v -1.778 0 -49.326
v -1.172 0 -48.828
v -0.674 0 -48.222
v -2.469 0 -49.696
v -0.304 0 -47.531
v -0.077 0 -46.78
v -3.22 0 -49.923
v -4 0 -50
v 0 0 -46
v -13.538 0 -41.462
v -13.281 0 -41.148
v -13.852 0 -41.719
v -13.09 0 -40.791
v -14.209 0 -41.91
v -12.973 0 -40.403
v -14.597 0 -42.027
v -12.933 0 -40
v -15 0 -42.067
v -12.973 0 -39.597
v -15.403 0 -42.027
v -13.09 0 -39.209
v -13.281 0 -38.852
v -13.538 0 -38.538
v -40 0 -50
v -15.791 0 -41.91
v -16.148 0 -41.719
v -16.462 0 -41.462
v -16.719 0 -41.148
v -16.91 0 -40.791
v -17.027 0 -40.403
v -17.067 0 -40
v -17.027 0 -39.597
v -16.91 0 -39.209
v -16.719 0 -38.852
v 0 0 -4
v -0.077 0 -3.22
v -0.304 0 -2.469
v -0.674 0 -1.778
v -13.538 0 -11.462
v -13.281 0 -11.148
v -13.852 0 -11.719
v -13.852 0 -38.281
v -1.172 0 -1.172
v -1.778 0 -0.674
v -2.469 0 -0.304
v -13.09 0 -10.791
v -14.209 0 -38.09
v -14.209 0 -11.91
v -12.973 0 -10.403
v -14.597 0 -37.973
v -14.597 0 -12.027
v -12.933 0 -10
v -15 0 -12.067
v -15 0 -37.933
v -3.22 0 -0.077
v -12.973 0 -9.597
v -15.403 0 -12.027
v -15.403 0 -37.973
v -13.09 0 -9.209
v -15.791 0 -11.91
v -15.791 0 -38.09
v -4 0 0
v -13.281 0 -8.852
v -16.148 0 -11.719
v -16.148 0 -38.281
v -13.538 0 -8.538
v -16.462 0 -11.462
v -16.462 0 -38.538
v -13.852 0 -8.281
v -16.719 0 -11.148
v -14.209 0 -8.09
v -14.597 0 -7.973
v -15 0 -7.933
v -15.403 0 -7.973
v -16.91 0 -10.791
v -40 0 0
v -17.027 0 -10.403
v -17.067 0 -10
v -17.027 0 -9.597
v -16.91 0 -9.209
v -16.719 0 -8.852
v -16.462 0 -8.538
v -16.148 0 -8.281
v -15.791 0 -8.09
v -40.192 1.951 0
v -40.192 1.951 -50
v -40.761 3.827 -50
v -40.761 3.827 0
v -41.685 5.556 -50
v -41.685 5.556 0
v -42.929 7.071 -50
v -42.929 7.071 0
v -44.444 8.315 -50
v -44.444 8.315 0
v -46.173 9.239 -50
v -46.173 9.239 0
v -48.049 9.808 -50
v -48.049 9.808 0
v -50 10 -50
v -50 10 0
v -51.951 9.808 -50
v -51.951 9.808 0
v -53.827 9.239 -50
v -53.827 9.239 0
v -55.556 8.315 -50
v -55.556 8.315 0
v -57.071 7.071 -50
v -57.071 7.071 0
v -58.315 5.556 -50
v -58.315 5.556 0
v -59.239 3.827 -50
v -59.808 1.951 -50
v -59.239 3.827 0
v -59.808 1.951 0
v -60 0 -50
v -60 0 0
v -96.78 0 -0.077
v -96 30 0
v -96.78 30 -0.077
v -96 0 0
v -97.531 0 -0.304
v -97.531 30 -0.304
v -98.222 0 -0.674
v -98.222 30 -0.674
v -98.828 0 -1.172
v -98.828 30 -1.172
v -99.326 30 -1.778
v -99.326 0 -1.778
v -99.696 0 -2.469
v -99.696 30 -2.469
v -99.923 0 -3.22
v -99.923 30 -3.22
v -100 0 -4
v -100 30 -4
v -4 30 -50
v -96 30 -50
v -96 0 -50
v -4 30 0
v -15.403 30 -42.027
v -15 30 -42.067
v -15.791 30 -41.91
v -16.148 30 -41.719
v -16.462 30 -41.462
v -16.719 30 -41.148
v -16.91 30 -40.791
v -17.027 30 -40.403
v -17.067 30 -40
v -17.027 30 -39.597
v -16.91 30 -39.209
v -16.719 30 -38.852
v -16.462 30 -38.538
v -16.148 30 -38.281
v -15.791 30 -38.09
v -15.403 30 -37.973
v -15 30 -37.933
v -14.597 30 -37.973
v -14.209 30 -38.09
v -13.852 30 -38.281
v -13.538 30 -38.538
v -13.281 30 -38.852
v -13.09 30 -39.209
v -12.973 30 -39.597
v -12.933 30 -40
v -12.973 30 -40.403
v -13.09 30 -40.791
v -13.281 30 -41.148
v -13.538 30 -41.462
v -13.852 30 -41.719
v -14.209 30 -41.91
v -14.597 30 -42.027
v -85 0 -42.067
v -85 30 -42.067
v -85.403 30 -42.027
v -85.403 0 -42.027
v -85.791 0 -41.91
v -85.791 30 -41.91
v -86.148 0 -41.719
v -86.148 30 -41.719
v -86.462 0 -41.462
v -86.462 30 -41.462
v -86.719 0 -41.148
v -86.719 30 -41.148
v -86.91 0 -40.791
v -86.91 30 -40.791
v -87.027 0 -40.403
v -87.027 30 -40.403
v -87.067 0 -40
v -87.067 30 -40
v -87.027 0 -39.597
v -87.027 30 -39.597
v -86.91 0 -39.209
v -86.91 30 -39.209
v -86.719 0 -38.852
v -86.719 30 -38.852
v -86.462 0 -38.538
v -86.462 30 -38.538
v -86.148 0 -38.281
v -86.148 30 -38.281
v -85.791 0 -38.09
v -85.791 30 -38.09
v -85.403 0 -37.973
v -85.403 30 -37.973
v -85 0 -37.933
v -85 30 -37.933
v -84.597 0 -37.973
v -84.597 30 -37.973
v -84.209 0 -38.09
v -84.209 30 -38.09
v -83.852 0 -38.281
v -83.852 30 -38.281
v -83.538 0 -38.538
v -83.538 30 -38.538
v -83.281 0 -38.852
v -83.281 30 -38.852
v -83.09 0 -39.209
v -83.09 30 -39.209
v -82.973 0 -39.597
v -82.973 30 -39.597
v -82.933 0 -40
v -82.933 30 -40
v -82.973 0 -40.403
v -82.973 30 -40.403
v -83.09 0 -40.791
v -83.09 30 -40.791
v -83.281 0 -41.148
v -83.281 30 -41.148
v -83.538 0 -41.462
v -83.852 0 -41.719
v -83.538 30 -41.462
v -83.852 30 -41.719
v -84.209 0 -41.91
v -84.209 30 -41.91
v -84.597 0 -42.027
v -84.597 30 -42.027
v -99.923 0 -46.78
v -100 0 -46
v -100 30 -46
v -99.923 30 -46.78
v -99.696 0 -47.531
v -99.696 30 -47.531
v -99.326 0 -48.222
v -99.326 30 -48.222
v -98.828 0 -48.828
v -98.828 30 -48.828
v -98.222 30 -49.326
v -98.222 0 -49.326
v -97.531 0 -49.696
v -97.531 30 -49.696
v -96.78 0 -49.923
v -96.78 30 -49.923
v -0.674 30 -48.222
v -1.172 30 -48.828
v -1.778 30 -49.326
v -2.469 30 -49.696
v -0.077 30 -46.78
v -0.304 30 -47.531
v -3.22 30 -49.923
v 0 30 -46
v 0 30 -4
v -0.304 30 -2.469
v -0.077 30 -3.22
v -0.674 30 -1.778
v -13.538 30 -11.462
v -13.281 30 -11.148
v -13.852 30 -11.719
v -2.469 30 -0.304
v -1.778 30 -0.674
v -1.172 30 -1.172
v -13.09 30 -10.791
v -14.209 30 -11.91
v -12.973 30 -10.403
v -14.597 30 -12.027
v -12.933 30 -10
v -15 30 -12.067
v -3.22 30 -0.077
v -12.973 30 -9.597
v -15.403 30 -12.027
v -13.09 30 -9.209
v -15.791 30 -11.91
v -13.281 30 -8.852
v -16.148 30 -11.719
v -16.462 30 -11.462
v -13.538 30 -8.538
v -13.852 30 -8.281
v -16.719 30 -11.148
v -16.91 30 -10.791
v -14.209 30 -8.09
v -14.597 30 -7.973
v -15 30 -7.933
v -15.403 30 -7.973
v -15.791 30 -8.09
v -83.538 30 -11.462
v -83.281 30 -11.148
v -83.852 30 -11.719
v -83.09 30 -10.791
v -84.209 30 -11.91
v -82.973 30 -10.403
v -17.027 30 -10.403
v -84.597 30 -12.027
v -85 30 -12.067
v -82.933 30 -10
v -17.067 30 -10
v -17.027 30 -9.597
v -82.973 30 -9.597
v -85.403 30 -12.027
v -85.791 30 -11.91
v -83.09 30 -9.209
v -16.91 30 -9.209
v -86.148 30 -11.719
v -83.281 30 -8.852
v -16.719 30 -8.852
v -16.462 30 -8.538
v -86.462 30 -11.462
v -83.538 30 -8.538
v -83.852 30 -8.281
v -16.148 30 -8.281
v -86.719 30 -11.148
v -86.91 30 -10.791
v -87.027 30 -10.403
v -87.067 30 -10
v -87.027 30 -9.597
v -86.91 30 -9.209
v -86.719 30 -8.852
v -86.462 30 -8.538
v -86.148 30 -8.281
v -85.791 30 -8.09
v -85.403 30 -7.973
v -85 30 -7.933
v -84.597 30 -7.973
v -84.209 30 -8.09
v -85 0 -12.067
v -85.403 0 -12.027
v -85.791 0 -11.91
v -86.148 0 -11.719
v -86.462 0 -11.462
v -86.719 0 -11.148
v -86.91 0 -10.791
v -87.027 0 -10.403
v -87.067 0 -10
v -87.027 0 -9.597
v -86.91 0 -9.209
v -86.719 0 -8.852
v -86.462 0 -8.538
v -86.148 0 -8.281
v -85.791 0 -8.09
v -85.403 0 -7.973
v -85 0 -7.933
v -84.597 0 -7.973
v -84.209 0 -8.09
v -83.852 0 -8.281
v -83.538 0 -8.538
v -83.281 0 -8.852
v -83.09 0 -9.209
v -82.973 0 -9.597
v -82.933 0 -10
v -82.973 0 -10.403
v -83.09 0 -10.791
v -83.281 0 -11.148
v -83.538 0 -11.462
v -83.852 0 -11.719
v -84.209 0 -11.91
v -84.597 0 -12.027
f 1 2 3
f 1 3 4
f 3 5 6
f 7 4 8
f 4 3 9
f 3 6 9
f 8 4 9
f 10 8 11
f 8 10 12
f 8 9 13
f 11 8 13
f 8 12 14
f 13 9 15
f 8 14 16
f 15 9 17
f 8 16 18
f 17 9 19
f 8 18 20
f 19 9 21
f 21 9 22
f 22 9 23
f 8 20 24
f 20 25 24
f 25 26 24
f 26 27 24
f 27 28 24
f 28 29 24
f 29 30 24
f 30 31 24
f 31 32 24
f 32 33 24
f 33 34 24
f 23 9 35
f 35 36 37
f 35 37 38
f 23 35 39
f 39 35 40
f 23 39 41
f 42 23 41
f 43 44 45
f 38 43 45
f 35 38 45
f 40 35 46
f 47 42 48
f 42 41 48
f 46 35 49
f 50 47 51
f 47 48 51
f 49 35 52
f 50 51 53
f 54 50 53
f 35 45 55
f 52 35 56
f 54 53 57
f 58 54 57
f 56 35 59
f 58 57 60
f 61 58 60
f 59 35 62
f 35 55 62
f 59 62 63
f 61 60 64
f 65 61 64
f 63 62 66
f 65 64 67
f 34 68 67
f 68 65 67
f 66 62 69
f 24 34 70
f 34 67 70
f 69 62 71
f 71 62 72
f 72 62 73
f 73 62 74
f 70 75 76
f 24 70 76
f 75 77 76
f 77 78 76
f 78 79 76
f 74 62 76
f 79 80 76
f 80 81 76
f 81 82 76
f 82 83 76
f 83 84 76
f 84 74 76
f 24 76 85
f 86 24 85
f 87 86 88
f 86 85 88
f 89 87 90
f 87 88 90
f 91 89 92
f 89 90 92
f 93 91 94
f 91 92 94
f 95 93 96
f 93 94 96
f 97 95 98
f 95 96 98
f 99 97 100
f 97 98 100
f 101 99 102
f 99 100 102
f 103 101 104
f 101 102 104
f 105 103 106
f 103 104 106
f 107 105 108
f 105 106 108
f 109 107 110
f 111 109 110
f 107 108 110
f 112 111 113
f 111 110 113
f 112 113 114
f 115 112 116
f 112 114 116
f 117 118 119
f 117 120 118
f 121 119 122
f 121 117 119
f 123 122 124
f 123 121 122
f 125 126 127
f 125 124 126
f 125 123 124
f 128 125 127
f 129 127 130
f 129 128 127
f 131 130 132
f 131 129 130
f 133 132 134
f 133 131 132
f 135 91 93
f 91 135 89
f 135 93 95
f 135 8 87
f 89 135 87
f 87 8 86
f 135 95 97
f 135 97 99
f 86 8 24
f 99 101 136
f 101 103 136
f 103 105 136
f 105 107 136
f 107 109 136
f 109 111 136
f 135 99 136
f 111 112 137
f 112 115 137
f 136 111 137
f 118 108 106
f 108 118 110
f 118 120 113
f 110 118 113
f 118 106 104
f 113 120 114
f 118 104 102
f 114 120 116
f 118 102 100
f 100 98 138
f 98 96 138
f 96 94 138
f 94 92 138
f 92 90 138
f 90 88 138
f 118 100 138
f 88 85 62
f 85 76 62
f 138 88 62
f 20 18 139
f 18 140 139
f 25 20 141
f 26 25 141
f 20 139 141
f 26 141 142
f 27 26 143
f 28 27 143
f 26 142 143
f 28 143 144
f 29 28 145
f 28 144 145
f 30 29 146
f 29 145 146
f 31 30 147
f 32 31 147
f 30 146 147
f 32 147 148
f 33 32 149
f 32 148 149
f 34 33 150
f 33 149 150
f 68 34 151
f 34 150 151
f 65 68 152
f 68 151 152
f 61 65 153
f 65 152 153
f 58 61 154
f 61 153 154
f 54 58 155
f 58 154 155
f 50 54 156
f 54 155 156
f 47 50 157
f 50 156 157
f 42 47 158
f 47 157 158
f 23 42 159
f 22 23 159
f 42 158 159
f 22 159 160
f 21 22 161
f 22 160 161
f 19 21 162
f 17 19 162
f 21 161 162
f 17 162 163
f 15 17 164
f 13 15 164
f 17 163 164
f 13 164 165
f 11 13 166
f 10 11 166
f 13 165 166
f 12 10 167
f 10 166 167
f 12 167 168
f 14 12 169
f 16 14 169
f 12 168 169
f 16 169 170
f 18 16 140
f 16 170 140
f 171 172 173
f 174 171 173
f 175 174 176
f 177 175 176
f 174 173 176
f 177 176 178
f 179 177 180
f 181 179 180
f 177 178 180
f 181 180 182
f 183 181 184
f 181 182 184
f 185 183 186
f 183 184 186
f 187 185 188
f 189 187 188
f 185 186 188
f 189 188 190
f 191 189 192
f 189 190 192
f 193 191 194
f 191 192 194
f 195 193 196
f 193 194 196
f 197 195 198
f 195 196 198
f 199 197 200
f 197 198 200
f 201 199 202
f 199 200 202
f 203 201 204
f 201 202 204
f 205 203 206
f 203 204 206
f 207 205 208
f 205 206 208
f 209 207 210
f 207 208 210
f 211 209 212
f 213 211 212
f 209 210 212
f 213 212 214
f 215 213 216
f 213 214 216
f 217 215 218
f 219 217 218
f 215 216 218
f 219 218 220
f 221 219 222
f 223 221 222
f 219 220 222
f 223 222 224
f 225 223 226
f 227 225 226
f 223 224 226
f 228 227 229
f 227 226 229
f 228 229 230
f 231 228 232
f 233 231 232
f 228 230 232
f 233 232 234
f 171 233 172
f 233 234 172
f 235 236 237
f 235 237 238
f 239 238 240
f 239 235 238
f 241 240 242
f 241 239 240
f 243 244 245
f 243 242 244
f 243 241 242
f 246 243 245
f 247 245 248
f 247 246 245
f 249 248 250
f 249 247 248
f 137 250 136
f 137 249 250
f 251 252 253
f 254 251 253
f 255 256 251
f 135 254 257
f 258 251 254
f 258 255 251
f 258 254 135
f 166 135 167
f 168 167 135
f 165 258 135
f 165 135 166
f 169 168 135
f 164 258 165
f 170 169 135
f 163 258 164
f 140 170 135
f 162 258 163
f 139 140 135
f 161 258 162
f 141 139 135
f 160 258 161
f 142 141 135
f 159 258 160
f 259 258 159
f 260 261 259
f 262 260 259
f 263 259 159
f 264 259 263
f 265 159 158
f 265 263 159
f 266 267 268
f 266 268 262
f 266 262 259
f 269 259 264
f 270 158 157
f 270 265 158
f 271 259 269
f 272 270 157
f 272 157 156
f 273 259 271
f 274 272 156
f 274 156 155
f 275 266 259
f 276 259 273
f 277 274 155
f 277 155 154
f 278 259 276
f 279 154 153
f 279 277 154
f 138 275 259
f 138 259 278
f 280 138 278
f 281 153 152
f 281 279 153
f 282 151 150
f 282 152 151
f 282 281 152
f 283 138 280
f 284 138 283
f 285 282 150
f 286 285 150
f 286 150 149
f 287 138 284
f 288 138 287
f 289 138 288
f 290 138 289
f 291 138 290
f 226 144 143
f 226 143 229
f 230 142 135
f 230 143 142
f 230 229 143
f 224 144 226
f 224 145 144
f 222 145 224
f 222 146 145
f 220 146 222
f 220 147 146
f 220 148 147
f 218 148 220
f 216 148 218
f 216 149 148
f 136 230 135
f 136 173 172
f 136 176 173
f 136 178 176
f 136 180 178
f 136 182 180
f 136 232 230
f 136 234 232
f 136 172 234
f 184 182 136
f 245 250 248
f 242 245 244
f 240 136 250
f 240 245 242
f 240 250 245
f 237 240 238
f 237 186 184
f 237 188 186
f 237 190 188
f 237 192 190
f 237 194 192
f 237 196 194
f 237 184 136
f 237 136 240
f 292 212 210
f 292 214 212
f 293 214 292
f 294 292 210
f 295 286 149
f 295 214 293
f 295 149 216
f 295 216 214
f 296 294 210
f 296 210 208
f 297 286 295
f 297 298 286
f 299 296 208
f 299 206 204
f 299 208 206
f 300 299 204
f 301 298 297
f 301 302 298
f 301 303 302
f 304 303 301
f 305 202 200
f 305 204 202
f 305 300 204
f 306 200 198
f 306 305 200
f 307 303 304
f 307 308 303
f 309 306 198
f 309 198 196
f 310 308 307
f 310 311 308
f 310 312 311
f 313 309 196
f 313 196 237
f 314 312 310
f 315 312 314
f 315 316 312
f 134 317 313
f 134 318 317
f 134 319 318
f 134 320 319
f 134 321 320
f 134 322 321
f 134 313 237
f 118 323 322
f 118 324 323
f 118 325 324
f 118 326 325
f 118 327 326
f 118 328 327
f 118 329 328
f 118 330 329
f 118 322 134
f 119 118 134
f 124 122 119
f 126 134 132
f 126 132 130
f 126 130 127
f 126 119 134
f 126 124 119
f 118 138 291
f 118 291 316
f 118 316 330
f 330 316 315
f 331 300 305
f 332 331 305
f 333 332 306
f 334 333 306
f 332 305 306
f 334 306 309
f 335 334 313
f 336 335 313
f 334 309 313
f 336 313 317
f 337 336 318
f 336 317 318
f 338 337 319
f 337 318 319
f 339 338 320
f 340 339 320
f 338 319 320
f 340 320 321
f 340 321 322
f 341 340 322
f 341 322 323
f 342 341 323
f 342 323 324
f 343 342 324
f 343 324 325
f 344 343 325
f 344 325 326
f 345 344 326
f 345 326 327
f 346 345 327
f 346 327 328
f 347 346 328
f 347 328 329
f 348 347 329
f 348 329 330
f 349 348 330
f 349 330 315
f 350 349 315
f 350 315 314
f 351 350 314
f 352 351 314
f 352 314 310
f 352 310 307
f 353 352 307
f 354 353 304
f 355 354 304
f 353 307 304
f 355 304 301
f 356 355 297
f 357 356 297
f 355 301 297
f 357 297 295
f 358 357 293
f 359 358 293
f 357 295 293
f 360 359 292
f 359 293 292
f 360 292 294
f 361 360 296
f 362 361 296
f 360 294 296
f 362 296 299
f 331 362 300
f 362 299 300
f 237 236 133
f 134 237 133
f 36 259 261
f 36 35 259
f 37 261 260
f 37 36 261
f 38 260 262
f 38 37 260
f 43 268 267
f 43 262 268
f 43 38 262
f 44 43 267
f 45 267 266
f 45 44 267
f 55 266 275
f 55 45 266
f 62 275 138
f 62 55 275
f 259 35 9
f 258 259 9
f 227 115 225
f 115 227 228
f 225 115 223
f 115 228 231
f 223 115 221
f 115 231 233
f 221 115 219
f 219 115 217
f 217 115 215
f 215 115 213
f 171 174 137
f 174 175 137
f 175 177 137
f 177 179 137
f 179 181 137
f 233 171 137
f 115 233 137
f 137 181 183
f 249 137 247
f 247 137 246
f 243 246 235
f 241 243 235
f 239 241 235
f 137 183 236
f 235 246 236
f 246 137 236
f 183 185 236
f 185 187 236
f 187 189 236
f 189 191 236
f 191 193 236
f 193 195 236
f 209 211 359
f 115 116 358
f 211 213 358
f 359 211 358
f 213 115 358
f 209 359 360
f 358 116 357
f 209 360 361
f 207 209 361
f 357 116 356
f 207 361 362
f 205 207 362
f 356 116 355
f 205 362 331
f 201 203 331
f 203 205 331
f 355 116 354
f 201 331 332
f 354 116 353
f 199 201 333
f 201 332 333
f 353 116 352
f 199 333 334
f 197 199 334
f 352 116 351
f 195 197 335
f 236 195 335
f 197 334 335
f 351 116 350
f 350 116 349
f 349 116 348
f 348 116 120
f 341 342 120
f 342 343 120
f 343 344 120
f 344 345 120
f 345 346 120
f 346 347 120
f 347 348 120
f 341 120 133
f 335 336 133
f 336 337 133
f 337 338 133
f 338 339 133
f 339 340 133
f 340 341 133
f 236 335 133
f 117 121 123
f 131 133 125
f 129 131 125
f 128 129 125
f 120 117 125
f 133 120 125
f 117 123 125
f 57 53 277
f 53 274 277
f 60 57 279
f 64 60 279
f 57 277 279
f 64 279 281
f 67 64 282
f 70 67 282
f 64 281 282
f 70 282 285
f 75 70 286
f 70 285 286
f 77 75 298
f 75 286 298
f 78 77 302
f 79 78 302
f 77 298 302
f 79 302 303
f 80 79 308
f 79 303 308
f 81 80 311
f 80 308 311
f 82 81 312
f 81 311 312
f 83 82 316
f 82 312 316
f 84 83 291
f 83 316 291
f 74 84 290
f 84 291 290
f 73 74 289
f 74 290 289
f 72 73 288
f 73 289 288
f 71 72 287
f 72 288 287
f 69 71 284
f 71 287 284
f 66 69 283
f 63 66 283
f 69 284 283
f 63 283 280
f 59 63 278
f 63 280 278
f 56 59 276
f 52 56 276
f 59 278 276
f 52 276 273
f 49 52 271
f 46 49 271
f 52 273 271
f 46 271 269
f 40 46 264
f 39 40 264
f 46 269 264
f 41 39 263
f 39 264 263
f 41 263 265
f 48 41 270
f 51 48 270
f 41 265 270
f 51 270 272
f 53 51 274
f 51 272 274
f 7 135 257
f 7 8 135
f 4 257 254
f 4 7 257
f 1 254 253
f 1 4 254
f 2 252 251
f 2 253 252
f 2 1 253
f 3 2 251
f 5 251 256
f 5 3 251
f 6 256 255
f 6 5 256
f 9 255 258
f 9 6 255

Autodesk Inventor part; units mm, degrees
ref_plane "YZ Plane" through (0, 0, 0) normal (1, 0, 0) x (0, 1, 0)
ref_plane "XZ Plane" through (0, 0, 0) normal (0, 1, 0) x (-1, 0, 0)
ref_plane "XY Plane" through (0, 0, 0) normal (0, 0, 1) x (1, 0, 0)
sketch "Skizze2" plane through (0, 0, 0) normal (0, 1, 0) x (-1, 0, 0)
  line L0 (0, -4) -> (0, -46)
  line L1 (4, -50) -> (96, -50)
  line L2 (100, -46) -> (100, -4)
  line L3 (96, 0) -> (4, 0)
  arc A0 (100, -4) -> (96, 0) centre (96, -4) ccw
  arc A1 (96, -50) -> (100, -46) centre (96, -46) ccw
  arc A2 (0, -46) -> (4, -50) centre (4, -46) ccw
  arc A3 (4, 0) -> (0, -4) centre (4, -4) ccw
  point P0 (0, 0)
  point P1 (0, -50)
  point P2 (100, -50)
  point P3 (100, 0)
  dimension "breite" = 50
  dimension "länge" = 100
  dimension "d11" = 50
  dimension "radius" = 4
extrude "Extrusion2" add sketch "Skizze2" along normal blind 30
sketch "Skizze4" plane through (-96, 0, 0) normal (0, 0, 1) x (1, 0, 0)
  point P0 (96, 0)
sketch "Skizze5" plane through (-96, 0, 0) normal (0, 0, 1) x (1, 0, 0)
  line L0 (0, 0) -> (0, 30) projected
  line L1 (0, 0) -> (46, 0)
  line L2 (92, 0) -> (0, 0) projected
  circle A0 centre (46, 0) radius 10
  point P0 (96, 0)
  dimension "d15" = 20
extrude "Extrusion3" cut sketch "Skizze5" against normal through all
sketch "Skizze6" plane through (0, 0, 0) normal (0, -1, 0) x (1, 0, 0)
  line L0 (0, 0) -> (0, -10)
  line L1 (0, -4) -> (0, -46) projected
  line L2 (0, -10) -> (-15, -10)
  line L3 (-15, -10) -> (-85, -10)
  line L4 (-85, -10) -> (-85, -40)
  line L5 (-85, -40) -> (-15, -40)
  dimension "d18" = 10
  dimension "d19" = 15
  dimension "d20" = 70
  dimension "d21" = 30
  dimension "d22" = 70
hole "Bohrung1" at (-15, 0, -40) at (-15, 0, -10) at (-85, 0, -40) at (-85, 0, -10) direction (0, 1, 0) diameter 4.134 end through all thread size "M5x0.8" class "6H" standard "ISO Metric profile"
equation "\"d11\" = breite"
equation "\"d15\" = durchmesser"
equation "\"durchmesser\" = 20"
properties part number "TrittUT" material "PVC, hart"
